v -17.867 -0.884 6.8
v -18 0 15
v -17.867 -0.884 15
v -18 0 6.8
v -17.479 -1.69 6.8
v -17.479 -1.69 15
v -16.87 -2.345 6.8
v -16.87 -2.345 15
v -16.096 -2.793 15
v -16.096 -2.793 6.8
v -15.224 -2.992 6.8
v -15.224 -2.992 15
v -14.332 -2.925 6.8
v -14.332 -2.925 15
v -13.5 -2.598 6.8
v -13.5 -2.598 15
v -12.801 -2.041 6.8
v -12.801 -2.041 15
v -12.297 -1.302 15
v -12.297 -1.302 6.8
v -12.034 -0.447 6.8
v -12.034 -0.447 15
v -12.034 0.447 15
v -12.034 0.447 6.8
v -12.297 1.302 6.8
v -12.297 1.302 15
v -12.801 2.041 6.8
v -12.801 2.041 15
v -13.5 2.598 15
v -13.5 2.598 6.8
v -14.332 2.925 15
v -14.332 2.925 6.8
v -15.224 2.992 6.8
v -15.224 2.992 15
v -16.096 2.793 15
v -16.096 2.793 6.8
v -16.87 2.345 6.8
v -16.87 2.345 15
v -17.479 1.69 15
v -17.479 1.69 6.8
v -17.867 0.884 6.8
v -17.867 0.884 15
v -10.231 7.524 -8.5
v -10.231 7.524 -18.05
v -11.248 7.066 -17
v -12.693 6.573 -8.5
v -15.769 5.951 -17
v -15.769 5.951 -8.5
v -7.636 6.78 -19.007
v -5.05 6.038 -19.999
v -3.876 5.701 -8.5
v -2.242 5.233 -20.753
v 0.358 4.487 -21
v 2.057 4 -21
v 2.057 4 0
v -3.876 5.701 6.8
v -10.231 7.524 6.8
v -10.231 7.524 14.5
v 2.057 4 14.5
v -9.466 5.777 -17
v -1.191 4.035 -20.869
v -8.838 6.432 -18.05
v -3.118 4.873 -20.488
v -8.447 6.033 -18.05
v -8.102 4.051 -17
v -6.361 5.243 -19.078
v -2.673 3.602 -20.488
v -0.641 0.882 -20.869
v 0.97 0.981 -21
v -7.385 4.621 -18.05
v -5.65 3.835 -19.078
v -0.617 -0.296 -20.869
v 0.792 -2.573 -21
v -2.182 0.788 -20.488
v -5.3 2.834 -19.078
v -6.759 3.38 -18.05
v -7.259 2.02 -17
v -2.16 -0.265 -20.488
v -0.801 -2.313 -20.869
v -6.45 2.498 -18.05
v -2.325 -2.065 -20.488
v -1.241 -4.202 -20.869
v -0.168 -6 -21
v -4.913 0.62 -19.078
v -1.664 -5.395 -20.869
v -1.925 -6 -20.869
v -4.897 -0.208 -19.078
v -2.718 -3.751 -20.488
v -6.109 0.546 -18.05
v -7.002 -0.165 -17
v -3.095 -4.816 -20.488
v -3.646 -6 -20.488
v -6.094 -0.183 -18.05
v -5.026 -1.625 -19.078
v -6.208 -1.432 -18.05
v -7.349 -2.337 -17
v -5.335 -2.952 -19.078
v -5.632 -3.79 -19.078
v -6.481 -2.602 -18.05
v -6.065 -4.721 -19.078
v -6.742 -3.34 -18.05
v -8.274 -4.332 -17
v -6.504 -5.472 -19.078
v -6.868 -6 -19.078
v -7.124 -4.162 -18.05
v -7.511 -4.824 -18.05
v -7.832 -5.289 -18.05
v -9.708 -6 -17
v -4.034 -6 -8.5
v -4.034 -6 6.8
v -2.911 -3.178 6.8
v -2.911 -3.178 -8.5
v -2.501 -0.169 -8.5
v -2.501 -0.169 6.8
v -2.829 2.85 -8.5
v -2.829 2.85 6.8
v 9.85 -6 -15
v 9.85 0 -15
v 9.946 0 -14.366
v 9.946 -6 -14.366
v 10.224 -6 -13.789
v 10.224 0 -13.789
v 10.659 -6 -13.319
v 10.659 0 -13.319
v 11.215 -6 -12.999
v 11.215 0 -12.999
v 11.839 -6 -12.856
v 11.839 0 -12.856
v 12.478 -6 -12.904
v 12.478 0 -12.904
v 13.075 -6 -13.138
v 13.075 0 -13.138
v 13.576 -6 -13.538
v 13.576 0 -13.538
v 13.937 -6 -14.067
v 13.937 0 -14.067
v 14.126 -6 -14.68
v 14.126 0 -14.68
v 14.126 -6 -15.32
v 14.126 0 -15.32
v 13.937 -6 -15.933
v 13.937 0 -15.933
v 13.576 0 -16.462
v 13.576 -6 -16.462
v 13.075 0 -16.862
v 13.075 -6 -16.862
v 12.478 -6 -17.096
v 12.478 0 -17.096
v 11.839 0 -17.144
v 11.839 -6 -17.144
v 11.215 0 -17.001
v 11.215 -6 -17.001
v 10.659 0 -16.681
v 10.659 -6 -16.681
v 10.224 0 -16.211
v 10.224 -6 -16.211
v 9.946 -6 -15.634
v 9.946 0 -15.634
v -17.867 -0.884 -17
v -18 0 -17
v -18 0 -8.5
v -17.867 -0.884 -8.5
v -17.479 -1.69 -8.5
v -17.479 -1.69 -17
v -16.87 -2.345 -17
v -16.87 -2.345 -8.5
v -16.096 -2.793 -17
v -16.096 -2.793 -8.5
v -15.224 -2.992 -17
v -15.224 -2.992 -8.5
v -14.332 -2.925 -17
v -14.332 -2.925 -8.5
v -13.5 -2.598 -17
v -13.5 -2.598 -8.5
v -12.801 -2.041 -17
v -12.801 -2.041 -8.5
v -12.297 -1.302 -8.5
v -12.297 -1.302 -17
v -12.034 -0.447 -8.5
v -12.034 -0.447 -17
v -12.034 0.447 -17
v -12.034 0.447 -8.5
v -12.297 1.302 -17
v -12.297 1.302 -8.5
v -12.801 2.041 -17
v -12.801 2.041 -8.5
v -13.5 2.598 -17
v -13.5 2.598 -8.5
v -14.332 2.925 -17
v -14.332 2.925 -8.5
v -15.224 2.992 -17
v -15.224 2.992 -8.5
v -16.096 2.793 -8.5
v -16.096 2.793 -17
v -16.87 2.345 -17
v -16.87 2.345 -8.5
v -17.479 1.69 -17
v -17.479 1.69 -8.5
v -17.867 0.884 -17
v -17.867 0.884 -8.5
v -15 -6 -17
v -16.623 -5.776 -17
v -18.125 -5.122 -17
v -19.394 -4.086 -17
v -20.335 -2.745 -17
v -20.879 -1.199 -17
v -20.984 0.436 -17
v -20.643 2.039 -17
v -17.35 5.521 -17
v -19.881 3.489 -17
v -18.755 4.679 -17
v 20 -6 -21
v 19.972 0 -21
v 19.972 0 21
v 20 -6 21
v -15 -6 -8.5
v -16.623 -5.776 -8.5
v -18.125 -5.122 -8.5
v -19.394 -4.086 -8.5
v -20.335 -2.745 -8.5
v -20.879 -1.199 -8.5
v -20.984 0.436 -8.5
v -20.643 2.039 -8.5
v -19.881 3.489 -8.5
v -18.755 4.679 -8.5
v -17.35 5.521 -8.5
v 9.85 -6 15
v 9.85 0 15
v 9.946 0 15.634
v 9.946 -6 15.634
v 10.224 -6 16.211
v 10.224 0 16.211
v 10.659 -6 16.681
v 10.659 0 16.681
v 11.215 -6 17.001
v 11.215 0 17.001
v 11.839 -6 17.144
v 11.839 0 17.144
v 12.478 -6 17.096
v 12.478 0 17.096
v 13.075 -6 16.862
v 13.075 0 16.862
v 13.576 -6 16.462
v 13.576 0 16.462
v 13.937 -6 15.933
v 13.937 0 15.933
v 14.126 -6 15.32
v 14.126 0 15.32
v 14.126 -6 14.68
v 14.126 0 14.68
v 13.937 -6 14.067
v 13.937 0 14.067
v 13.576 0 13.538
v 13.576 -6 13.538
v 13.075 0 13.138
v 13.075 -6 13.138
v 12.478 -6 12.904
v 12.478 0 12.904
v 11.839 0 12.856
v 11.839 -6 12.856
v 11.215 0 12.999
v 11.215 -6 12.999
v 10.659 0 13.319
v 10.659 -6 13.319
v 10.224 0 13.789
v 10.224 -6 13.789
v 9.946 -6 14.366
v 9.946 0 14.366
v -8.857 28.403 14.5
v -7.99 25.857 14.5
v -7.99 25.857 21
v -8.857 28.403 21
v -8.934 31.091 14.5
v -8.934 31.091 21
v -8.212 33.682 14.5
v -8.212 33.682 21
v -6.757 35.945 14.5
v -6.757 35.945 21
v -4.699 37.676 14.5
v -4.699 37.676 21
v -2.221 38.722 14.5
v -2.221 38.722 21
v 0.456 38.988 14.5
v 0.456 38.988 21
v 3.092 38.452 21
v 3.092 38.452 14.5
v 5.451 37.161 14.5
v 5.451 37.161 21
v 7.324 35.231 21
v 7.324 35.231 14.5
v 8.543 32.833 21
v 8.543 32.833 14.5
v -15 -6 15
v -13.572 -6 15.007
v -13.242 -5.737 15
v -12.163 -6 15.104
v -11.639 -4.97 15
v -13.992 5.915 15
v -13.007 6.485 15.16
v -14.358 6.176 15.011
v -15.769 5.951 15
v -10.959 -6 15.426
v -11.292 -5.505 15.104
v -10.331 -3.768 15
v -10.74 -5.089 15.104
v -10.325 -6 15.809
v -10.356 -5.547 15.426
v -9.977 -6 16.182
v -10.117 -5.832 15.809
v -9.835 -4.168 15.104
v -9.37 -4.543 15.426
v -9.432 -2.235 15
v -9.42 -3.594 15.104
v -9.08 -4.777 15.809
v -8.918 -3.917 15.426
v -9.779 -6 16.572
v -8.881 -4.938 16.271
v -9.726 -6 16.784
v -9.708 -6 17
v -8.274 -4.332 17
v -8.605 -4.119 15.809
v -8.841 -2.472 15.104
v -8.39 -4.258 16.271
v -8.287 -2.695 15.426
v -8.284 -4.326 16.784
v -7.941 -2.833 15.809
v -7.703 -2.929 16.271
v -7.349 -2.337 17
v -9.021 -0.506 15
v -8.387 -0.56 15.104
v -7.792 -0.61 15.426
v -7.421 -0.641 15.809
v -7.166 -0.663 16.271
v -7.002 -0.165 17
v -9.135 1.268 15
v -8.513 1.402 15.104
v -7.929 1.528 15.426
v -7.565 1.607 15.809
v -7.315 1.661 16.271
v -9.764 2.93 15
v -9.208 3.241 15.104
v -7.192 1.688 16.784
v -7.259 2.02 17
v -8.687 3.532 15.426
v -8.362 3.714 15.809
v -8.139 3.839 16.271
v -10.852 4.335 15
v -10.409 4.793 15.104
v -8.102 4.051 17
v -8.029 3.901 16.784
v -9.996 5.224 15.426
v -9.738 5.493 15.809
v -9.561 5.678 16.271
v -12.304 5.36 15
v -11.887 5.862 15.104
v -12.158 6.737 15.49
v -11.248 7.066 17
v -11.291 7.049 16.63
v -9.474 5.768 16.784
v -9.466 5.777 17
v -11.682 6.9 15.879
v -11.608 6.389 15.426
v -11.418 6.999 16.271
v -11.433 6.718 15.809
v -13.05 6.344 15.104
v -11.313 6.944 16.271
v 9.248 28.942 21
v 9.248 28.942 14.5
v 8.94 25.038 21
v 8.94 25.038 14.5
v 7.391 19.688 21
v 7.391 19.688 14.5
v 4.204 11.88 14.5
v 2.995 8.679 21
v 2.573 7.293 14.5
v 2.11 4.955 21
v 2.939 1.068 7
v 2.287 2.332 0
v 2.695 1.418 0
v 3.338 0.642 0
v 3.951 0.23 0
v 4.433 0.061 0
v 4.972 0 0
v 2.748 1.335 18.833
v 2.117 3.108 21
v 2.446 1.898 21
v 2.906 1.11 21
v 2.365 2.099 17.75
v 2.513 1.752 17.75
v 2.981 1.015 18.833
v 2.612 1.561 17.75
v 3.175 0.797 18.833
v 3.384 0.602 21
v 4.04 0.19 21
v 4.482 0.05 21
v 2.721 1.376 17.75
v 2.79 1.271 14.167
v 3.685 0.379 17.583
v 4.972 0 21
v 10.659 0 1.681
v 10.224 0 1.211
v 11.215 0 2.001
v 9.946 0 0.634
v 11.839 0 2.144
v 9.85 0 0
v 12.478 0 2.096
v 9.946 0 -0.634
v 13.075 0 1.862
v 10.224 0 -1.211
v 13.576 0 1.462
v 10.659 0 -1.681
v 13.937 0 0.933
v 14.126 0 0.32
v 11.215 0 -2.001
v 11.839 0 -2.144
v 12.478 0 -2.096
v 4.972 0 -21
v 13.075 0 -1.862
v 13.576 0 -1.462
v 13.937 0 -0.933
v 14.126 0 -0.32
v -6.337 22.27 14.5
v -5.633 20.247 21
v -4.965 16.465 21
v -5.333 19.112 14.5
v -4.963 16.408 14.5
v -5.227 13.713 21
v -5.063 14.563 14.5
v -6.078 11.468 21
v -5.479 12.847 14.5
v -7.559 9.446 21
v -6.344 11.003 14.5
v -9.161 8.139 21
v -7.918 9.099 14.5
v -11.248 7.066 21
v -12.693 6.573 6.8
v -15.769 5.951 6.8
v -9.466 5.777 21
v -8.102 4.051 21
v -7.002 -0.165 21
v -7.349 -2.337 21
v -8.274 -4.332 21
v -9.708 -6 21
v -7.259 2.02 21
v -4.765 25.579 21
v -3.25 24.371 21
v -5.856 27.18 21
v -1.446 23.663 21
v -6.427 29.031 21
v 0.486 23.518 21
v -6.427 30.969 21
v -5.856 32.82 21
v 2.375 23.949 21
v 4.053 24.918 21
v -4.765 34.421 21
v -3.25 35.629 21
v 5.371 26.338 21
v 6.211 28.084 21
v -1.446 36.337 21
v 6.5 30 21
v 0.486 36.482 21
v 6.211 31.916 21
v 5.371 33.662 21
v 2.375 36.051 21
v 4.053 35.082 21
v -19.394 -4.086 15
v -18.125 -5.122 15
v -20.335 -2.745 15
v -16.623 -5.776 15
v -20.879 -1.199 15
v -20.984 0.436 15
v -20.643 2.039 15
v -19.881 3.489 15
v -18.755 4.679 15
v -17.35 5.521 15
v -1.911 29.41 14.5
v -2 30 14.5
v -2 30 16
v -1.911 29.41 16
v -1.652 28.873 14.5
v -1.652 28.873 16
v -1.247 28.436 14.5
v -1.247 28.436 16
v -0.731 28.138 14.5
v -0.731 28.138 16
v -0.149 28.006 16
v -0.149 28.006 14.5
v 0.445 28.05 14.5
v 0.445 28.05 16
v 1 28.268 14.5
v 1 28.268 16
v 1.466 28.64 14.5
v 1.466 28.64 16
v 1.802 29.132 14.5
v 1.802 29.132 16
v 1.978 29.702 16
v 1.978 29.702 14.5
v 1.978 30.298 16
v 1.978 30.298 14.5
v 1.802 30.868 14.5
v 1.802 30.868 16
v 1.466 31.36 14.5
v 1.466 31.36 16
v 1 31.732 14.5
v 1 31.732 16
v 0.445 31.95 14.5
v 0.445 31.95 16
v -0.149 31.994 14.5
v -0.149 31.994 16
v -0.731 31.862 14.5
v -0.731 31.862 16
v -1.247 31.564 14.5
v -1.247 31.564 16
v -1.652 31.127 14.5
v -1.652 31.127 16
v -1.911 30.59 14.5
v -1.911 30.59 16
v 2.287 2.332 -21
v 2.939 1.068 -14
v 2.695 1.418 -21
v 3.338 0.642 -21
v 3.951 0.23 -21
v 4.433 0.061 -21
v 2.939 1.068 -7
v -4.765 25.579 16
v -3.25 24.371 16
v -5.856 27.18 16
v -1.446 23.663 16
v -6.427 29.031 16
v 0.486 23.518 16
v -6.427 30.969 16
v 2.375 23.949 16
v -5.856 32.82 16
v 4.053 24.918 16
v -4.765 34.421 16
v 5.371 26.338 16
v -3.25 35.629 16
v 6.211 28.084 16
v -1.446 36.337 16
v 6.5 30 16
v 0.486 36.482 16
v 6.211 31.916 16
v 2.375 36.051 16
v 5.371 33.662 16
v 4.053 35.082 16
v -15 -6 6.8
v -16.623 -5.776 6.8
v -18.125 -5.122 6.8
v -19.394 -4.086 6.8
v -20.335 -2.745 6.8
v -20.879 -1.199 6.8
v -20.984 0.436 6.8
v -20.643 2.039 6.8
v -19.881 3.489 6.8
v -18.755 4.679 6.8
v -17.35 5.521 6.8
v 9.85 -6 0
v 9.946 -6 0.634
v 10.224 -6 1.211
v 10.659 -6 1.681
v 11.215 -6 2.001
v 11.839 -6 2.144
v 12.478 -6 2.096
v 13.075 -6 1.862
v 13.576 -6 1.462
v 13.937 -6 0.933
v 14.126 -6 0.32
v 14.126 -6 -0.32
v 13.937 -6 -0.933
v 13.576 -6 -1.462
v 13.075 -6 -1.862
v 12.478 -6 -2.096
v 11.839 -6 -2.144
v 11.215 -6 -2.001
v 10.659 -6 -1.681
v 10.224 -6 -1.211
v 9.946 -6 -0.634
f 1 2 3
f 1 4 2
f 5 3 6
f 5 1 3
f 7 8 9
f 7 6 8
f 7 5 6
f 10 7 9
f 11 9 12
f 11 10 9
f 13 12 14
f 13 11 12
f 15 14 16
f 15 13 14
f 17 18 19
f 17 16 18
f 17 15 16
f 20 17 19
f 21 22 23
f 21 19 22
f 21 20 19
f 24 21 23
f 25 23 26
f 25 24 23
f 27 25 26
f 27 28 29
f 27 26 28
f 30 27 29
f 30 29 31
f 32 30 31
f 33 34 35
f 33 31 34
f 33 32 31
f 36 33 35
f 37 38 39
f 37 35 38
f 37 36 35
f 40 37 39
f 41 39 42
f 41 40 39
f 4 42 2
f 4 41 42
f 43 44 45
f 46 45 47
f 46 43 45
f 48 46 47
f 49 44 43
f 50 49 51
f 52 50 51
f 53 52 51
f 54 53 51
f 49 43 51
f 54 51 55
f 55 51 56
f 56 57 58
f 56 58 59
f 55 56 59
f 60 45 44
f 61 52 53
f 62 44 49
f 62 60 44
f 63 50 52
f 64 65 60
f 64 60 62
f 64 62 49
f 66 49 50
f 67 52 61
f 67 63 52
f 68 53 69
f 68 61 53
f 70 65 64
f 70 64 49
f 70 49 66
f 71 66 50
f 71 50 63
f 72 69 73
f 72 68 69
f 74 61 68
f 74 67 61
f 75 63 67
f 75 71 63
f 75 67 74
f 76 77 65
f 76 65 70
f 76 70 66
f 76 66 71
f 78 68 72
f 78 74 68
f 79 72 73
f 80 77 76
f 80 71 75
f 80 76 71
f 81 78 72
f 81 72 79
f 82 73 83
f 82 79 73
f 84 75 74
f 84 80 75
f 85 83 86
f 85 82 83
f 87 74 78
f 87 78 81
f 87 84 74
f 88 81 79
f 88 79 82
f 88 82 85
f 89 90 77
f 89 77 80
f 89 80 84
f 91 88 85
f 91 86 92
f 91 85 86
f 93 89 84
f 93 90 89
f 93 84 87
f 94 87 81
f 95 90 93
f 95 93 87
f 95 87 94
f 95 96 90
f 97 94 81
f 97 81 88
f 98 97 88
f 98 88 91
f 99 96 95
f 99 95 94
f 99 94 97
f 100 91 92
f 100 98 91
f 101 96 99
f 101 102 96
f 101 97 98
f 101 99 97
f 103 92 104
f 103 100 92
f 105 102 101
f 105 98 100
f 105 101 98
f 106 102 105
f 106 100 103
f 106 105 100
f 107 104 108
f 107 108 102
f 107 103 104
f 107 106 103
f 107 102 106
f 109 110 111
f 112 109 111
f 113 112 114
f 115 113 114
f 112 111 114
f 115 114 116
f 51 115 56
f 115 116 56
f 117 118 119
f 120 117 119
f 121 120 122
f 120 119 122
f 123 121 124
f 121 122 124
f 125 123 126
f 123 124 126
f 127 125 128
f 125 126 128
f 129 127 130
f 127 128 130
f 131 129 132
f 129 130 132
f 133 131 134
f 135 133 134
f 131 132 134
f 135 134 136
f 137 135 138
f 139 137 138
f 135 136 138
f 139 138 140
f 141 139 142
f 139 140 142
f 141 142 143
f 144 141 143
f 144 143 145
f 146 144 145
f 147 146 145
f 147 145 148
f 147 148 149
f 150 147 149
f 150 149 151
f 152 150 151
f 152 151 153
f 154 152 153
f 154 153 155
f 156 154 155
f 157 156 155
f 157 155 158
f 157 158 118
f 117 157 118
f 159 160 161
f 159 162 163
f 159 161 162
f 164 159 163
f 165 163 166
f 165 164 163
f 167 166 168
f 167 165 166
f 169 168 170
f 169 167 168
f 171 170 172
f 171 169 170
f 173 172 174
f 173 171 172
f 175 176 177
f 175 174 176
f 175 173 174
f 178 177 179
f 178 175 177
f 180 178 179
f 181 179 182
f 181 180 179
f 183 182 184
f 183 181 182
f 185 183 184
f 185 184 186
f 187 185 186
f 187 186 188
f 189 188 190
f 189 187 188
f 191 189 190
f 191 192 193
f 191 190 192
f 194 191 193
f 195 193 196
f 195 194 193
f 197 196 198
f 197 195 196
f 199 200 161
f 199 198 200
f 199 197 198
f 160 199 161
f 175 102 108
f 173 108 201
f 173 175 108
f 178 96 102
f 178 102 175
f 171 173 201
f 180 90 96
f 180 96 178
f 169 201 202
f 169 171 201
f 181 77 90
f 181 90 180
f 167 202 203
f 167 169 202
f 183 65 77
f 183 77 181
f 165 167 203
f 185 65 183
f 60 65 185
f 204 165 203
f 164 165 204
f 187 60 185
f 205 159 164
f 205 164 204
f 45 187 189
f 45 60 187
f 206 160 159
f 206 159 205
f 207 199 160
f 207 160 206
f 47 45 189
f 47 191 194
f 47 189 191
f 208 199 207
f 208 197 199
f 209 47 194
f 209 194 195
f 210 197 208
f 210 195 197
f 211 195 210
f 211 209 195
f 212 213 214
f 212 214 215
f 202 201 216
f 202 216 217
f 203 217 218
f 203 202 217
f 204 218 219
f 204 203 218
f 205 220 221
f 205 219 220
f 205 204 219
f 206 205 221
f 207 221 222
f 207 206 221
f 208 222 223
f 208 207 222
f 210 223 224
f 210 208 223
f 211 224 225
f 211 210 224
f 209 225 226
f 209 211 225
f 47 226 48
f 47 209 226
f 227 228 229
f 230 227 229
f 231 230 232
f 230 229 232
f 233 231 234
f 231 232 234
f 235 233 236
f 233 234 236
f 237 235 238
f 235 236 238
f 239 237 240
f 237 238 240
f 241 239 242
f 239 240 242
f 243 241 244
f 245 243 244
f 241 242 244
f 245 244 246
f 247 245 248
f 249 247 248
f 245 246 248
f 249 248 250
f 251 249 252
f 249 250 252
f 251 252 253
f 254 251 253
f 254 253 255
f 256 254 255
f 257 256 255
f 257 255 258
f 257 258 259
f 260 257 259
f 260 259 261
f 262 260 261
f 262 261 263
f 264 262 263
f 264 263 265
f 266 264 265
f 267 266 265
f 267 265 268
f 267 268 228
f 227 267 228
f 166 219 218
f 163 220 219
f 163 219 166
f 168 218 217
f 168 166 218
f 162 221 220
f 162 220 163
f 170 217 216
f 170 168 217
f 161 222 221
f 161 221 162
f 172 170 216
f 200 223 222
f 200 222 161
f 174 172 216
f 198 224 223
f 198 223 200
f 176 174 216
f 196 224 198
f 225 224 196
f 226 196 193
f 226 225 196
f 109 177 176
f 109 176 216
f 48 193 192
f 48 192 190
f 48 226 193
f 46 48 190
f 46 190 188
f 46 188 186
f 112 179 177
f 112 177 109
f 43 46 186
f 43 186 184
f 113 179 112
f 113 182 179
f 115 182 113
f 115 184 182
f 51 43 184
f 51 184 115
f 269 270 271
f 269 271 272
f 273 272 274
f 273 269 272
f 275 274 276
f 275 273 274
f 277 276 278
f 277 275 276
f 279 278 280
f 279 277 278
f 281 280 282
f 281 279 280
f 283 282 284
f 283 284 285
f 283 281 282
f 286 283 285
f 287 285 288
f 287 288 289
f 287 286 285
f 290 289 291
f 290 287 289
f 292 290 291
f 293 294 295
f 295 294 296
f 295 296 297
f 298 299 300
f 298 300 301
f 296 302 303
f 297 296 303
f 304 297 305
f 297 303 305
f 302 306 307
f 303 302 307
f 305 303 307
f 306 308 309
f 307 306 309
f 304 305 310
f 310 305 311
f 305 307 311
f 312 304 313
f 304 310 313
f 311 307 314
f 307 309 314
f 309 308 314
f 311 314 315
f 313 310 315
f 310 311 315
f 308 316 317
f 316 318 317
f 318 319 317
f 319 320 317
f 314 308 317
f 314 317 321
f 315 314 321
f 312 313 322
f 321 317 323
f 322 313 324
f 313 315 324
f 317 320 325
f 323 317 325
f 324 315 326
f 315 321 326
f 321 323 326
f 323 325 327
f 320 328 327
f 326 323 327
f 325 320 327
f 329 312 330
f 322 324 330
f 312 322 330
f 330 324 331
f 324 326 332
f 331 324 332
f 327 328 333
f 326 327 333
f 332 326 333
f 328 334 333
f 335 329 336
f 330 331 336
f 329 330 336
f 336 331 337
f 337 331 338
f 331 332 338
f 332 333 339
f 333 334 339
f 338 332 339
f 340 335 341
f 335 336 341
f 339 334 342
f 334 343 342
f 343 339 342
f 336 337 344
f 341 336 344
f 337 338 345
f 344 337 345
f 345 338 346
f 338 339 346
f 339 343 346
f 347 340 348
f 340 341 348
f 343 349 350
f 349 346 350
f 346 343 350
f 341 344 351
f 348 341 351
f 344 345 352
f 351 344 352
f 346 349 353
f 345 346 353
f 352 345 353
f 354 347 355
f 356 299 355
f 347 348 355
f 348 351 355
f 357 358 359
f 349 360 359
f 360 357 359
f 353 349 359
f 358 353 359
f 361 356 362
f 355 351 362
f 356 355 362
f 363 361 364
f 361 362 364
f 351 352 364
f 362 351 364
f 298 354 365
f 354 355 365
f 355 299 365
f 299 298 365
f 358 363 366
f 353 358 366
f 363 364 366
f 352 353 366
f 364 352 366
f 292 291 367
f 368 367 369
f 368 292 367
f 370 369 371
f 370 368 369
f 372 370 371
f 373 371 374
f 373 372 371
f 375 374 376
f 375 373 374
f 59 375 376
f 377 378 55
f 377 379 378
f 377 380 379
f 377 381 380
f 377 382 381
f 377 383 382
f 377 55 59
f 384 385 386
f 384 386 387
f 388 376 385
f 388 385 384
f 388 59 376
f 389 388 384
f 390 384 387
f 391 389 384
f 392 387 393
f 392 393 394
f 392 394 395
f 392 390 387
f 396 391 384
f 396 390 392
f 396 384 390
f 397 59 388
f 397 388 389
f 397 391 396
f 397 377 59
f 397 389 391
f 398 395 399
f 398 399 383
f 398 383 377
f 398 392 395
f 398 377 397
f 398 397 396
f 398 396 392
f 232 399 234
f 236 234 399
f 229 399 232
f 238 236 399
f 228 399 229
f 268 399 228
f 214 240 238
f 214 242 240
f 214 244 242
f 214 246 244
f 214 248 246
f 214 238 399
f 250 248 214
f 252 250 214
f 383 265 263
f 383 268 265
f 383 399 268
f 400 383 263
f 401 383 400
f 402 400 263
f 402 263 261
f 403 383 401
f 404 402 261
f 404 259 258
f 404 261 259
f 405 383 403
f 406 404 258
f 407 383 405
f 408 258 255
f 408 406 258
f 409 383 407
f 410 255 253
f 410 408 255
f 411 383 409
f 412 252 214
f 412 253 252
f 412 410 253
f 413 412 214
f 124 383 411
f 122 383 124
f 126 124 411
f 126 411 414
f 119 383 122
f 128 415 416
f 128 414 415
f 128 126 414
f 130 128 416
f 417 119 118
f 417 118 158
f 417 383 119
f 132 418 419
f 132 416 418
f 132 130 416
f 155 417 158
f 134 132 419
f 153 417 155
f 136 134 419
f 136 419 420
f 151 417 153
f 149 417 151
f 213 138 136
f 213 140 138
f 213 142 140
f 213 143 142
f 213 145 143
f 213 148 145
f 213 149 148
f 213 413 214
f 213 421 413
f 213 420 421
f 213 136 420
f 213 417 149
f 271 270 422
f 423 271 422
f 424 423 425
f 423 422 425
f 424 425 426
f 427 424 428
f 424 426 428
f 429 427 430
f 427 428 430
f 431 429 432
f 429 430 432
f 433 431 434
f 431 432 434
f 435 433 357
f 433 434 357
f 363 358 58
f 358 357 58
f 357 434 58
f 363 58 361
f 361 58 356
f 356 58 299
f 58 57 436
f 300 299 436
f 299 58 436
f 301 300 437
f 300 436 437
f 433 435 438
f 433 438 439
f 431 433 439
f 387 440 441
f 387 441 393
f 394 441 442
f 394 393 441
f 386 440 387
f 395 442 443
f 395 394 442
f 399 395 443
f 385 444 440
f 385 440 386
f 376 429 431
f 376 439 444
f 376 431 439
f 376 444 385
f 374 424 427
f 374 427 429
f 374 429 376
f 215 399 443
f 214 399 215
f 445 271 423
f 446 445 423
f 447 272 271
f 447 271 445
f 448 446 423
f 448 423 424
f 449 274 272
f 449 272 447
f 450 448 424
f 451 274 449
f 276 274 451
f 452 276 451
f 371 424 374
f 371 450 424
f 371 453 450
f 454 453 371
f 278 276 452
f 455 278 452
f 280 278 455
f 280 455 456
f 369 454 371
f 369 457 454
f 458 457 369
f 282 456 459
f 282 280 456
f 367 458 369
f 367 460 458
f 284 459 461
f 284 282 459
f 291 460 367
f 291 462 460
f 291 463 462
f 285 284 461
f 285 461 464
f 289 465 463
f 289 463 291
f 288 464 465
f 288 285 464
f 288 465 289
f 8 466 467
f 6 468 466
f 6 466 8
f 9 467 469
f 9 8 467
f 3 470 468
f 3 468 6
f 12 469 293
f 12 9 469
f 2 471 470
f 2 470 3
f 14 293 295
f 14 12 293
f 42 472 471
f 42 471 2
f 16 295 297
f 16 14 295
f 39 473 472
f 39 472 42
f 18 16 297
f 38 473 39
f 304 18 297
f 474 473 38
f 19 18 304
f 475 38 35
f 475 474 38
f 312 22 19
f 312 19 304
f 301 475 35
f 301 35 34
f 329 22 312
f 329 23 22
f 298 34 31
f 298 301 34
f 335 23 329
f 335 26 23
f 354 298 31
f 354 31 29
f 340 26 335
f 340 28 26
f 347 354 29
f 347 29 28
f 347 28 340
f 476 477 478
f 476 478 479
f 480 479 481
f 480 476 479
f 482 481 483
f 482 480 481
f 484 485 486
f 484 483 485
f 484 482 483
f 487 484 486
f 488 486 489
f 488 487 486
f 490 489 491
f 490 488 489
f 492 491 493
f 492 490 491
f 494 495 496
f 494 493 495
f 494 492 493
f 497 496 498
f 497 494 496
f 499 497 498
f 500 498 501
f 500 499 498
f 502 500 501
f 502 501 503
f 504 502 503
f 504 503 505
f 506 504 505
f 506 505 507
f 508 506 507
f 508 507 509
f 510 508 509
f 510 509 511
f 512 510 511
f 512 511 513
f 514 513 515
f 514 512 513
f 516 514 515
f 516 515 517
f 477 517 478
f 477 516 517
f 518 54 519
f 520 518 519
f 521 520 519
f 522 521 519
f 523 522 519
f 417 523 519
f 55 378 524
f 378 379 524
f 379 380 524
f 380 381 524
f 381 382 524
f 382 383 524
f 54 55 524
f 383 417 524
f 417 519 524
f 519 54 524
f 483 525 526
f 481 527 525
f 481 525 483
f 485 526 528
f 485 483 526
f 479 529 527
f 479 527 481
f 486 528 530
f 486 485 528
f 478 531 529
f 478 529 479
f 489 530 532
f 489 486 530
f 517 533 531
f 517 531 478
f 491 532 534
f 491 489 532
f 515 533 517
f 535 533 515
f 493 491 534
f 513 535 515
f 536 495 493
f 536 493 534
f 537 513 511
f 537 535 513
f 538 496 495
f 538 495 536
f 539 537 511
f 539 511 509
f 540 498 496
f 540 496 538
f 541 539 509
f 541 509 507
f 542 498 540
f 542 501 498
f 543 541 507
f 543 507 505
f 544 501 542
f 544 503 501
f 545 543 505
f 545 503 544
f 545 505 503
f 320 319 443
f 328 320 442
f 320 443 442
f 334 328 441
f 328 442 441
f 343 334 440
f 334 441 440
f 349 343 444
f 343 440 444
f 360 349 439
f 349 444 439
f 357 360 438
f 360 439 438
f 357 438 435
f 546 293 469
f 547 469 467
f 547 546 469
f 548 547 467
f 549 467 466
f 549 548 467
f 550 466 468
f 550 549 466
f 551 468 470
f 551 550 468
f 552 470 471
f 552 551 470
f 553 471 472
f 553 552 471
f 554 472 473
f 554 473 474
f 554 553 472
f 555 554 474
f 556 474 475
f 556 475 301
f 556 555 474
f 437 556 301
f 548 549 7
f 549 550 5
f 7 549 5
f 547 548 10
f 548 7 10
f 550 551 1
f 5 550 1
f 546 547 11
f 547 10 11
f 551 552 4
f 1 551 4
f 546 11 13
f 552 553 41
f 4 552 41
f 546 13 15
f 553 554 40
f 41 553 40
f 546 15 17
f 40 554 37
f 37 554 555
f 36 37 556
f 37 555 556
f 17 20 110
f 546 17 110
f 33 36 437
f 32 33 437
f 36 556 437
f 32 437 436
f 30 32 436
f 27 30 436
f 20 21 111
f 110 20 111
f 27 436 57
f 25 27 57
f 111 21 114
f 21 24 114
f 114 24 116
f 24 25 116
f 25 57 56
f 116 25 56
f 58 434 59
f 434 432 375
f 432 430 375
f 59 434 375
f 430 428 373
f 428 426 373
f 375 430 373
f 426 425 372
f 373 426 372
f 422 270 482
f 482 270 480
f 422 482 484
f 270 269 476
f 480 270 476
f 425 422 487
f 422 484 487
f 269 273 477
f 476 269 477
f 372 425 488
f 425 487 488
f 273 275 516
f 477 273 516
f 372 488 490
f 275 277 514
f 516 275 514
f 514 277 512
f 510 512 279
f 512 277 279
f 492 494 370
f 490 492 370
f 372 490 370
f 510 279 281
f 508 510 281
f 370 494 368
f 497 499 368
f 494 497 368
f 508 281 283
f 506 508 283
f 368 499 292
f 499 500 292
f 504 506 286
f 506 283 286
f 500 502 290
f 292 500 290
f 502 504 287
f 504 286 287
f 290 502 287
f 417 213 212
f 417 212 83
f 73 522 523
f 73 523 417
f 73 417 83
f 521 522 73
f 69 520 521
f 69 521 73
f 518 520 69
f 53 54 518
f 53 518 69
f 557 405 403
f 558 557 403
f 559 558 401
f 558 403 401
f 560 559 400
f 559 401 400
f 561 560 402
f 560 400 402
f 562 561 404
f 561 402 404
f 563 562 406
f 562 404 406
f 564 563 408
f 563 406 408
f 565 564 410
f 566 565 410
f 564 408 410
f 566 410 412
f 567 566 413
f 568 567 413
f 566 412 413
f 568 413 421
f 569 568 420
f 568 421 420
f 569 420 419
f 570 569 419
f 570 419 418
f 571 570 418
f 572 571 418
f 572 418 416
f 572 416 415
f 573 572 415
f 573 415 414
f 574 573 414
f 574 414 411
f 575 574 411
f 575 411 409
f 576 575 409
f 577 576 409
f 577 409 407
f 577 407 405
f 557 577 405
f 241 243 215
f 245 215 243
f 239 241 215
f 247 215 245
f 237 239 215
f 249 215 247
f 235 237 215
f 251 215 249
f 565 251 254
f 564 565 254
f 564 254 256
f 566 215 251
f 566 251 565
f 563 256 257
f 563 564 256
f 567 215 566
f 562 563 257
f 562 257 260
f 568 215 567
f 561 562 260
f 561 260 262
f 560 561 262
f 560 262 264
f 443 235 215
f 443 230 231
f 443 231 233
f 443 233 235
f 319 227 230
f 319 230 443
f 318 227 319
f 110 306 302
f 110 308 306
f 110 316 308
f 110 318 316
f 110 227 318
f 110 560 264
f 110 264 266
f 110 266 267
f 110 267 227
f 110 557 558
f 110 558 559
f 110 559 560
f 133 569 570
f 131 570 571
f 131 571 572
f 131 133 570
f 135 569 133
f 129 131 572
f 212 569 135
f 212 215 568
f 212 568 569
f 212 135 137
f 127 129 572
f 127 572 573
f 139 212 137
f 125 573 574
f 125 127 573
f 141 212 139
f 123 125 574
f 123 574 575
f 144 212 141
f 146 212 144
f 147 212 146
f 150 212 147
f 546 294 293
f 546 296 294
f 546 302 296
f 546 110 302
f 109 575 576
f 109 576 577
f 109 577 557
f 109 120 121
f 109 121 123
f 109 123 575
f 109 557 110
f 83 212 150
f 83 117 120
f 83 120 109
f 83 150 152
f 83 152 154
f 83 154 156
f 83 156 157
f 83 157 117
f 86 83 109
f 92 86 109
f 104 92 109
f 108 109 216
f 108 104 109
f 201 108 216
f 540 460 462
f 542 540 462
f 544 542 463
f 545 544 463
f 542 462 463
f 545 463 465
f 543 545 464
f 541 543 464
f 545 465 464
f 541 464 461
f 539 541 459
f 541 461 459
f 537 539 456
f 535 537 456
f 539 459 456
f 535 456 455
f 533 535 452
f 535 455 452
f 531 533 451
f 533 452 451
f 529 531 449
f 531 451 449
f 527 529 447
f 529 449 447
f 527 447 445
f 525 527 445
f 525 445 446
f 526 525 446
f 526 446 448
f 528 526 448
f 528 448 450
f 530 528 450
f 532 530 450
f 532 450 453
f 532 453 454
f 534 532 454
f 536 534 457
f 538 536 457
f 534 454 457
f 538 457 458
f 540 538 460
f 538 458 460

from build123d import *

# Parameters (mm, degrees)
SKETCH1_R           = 6.5
SKETCH1_R_2         = 3.000000000000001
SKETCH1_R_3         = 2.000000000000001
BOSS_EXTRUDE1_DEPTH = 21
CUT_EXTRUDE1_START  = -35.5
CUT_EXTRUDE1_DEPTH  = 35.5
CUT_EXTRUDE2_START  = -14.2
CUT_EXTRUDE2_DEPTH  = 15.3
SKETCH4_R           = 2.1500000000000012
SKETCH4_R_2         = 2.149999999999999
CUT_EXTRUDE3_DEPTH  = 15.3
SKETCH6_R           = 6.499999999999999
CUT_EXTRUDE4_DEPTH  = 5
SKETCH7_R           = 8.000000000000002
CUT_EXTRUDE5_DEPTH  = 6
CUT_EXTRUDE6_START  = -4
SKETCH8_R           = 8.000000000000002
CUT_EXTRUDE6_DEPTH  = 4
FILLET1_R           = 10
FILLET3_R           = 2


with BuildPart() as part:
    # Sketch1 → Boss-Extrude1 (new, symmetric)
    # profile 1 of 2: a face of its own
    with BuildSketch(Plane.XY):
        with BuildLine():
            add(Edge.make_bspline(
                [(8.542559375854681, 32.832786492130545), (10.686678203257555, 26.366975375458193), (5.856141786689584, 16.523631312439278), (0.5083868378802346, 2.514637421674764), (4.080331624706952, -3.187e-14), (4.9722311918748305, 5.6e-16)],
                knots=[0, 0, 0, 0, 0.5826135462254243, 0.9212236747100581, 1, 1, 1, 1], degree=3))
            Line((4.9722311918748305, 5.6e-16), (19.97223119187482, -6.1e-16))
            Line((19.97223119187482, -6.1e-16), (20.000000000000004, -6.000000000000001))
            Line((20.000000000000004, -6.000000000000001), (-15, -6.000000000000003))
            ThreePointArc((-15, -6.000000000000003), (-20.98762892620649, -0.38509718520825564), (-15.768606348517892, 5.950566719314891))
            add(Edge.make_bspline(
                [(-7.98954445714796, 25.856670497383014), (-4.906742308970248, 19.912131256682922), (-3.6628937282407366, 12.195881997757215), (-9.793673492034818, 6.722320325665471), (-15.768606348517892, 5.950566719314891)],
                knots=[0, 0, 0, 0, 0.5365412355207451, 1, 1, 1, 1], degree=3))
            ThreePointArc((-7.98954445714796, 25.856670497383014), (-3.4990005670363873, 38.29198378145294), (8.542559375854681, 32.832786492130545))
        make_face()
        with Locations((1.388e-14, 30)):
            Circle(SKETCH1_R, mode=Mode.SUBTRACT)
        with Locations(Location((-15, 0, 0), (0, 0, 180))):
            Circle(SKETCH1_R_2, mode=Mode.SUBTRACT)
    # profile 2 of 2: a face of its own
    with BuildSketch(Plane.XY):
        with Locations((1.388e-14, 30)):
            Circle(SKETCH1_R)
        with Locations(Location((1.388e-14, 30, 0), (0, 0, 180))):
            Circle(SKETCH1_R_3, mode=Mode.SUBTRACT)
    extrude(amount=BOSS_EXTRUDE1_DEPTH, both=True)

    # Sketch2 → Cut-Extrude1 (cut)
    with BuildSketch(Plane(origin=(0, 0, -21), x_dir=(-1, 0, 0), z_dir=(0, 0, -1)).offset(CUT_EXTRUDE1_START)):
        with BuildLine():
            Line((10.231277065568076, 7.523716250881215), (-2.057381883744481, 3.999999999999989))
            add(Edge.make_bspline(
                [(-8.542559375854681, 32.832786492130545), (-10.686678203257555, 26.366975375458193), (-6.407471523281442, 17.647094178971816), (-2.0529735437800074, 6.524226588369356), (-2.057381883744481, 3.999999999999989)],
                knots=[0, 0, 0, 0, 0.5826135462254243, 0.8160804851922084, 0.8160804851922084, 0.8160804851922084, 0.8160804851922084], degree=3))
            ThreePointArc((-8.542559375854681, 32.832786492130545), (3.499000567036403, 38.29198378145297), (7.98954445714796, 25.856670497383014))
            add(Edge.make_bspline(
                [(10.231277065568076, 7.523716250881215), (7.863619154783306, 8.719037669732709), (3.881869806613929, 13.55430618913155), (4.906742308970248, 19.912131256682922), (7.98954445714796, 25.856670497383014)],
                knots=[0.17604721488266967, 0.17604721488266967, 0.17604721488266967, 0.17604721488266967, 0.46345876447925494, 1, 1, 1, 1], degree=3))
        make_face()
    extrude(amount=CUT_EXTRUDE1_DEPTH, mode=Mode.SUBTRACT)

    # Sketch3 → Cut-Extrude2 (cut)
    with BuildSketch(Plane.XY.offset(21).offset(CUT_EXTRUDE2_START)):
        with BuildLine():
            Line((-15.000000000000002, -6.000000000000002), (-4.0341439002693456, -6.000000000000003))
            ThreePointArc((-4.0341439002693456, -6.000000000000003), (-2.748923532280786, 2.482161433528555), (-7.234360367683872, 9.795143750910501))
            add(Edge.make_bspline(
                [(-7.234360367683872, 9.795143750910501), (-8.872569061817323, 7.931489713842532), (-11.533359351024282, 6.497613392911335), (-15.768606348517892, 5.950566719314891)],
                knots=[0.6714837826850107, 0.6714837826850107, 0.6714837826850107, 0.6714837826850107, 1, 1, 1, 1], degree=3))
            ThreePointArc((-15.768606348517892, 5.950566719314891), (-20.98762892620649, -0.3850971852082583), (-15.000000000000002, -6.000000000000002))
        make_face()
    extrude(amount=-CUT_EXTRUDE2_DEPTH, mode=Mode.SUBTRACT)

    # Sketch4 → Cut-Extrude3 (cut)
    with BuildSketch(Plane(origin=(0, 0, 0), x_dir=(1, 1.3e-16, 0), z_dir=(-1.3e-16, 1, 0))):
        with Locations(Location((12, 0, 0), (0, 0, 180))):
            Circle(SKETCH4_R)
        with Locations(Location((11.999999999999996, 15, 0), (0, 0, 180))):
            Circle(SKETCH4_R_2)
        with Locations(Location((11.999999999999996, -15, 0), (0, 0, 180))):
            Circle(SKETCH4_R_2)
    extrude(amount=-CUT_EXTRUDE3_DEPTH, mode=Mode.SUBTRACT)

    # Sketch6 → Cut-Extrude4 (cut)
    with BuildSketch(Plane.XY.offset(21)):
        with Locations((1.388e-14, 30)):
            Circle(SKETCH6_R)
    extrude(amount=-CUT_EXTRUDE4_DEPTH, mode=Mode.SUBTRACT)

    # Sketch7 → Cut-Extrude5 (cut)
    with BuildSketch(Plane.XY.offset(21)):
        with Locations((-15, 0)):
            Circle(SKETCH7_R)
    extrude(amount=-CUT_EXTRUDE5_DEPTH, mode=Mode.SUBTRACT)

    # Sketch8 → Cut-Extrude6 (cut)
    with BuildSketch(Plane(origin=(0, 0, -21), x_dir=(-1, 0, 0), z_dir=(0, 0, -1)).offset(CUT_EXTRUDE6_START)):
        with Locations((15, 0)):
            Circle(SKETCH8_R)
    extrude(amount=CUT_EXTRUDE6_DEPTH, mode=Mode.SUBTRACT)

    # Fillet1
    # the kernel refuses this fillet: 10 mm, written as the material it takes off along each edge
    with BuildSketch(Plane(origin=(-15, 0, -21), x_dir=(-0.9934899400699477, -0.11391987965149795, 0), z_dir=(0.11391987965149795, -0.9934899400699477, 0))) as fillet1_piece_1:
        with BuildLine():
            CenterArc((16.000000000000007, -10.000000000000002), FILLET1_R, 90, 53.13010235415598)
            Line((8.000000000000004, -4), (8.000000000000004, 0))
            Line((8.000000000000004, 0), (16.000000000000007, 0))
        make_face()
    revolve(axis=Axis((-15, 0, -21), (0, 0, -1)), revolution_arc=359.6400000000001, mode=Mode.SUBTRACT)

    # Fillet3
    fillet3_edges = [part.edges().sort_by_distance(p)[0] for p in [
        (-7.0549828149653875, 0.9363236243440207, 15),
    ]]
    fillet(fillet3_edges, radius=FILLET3_R)


solid = part.part
